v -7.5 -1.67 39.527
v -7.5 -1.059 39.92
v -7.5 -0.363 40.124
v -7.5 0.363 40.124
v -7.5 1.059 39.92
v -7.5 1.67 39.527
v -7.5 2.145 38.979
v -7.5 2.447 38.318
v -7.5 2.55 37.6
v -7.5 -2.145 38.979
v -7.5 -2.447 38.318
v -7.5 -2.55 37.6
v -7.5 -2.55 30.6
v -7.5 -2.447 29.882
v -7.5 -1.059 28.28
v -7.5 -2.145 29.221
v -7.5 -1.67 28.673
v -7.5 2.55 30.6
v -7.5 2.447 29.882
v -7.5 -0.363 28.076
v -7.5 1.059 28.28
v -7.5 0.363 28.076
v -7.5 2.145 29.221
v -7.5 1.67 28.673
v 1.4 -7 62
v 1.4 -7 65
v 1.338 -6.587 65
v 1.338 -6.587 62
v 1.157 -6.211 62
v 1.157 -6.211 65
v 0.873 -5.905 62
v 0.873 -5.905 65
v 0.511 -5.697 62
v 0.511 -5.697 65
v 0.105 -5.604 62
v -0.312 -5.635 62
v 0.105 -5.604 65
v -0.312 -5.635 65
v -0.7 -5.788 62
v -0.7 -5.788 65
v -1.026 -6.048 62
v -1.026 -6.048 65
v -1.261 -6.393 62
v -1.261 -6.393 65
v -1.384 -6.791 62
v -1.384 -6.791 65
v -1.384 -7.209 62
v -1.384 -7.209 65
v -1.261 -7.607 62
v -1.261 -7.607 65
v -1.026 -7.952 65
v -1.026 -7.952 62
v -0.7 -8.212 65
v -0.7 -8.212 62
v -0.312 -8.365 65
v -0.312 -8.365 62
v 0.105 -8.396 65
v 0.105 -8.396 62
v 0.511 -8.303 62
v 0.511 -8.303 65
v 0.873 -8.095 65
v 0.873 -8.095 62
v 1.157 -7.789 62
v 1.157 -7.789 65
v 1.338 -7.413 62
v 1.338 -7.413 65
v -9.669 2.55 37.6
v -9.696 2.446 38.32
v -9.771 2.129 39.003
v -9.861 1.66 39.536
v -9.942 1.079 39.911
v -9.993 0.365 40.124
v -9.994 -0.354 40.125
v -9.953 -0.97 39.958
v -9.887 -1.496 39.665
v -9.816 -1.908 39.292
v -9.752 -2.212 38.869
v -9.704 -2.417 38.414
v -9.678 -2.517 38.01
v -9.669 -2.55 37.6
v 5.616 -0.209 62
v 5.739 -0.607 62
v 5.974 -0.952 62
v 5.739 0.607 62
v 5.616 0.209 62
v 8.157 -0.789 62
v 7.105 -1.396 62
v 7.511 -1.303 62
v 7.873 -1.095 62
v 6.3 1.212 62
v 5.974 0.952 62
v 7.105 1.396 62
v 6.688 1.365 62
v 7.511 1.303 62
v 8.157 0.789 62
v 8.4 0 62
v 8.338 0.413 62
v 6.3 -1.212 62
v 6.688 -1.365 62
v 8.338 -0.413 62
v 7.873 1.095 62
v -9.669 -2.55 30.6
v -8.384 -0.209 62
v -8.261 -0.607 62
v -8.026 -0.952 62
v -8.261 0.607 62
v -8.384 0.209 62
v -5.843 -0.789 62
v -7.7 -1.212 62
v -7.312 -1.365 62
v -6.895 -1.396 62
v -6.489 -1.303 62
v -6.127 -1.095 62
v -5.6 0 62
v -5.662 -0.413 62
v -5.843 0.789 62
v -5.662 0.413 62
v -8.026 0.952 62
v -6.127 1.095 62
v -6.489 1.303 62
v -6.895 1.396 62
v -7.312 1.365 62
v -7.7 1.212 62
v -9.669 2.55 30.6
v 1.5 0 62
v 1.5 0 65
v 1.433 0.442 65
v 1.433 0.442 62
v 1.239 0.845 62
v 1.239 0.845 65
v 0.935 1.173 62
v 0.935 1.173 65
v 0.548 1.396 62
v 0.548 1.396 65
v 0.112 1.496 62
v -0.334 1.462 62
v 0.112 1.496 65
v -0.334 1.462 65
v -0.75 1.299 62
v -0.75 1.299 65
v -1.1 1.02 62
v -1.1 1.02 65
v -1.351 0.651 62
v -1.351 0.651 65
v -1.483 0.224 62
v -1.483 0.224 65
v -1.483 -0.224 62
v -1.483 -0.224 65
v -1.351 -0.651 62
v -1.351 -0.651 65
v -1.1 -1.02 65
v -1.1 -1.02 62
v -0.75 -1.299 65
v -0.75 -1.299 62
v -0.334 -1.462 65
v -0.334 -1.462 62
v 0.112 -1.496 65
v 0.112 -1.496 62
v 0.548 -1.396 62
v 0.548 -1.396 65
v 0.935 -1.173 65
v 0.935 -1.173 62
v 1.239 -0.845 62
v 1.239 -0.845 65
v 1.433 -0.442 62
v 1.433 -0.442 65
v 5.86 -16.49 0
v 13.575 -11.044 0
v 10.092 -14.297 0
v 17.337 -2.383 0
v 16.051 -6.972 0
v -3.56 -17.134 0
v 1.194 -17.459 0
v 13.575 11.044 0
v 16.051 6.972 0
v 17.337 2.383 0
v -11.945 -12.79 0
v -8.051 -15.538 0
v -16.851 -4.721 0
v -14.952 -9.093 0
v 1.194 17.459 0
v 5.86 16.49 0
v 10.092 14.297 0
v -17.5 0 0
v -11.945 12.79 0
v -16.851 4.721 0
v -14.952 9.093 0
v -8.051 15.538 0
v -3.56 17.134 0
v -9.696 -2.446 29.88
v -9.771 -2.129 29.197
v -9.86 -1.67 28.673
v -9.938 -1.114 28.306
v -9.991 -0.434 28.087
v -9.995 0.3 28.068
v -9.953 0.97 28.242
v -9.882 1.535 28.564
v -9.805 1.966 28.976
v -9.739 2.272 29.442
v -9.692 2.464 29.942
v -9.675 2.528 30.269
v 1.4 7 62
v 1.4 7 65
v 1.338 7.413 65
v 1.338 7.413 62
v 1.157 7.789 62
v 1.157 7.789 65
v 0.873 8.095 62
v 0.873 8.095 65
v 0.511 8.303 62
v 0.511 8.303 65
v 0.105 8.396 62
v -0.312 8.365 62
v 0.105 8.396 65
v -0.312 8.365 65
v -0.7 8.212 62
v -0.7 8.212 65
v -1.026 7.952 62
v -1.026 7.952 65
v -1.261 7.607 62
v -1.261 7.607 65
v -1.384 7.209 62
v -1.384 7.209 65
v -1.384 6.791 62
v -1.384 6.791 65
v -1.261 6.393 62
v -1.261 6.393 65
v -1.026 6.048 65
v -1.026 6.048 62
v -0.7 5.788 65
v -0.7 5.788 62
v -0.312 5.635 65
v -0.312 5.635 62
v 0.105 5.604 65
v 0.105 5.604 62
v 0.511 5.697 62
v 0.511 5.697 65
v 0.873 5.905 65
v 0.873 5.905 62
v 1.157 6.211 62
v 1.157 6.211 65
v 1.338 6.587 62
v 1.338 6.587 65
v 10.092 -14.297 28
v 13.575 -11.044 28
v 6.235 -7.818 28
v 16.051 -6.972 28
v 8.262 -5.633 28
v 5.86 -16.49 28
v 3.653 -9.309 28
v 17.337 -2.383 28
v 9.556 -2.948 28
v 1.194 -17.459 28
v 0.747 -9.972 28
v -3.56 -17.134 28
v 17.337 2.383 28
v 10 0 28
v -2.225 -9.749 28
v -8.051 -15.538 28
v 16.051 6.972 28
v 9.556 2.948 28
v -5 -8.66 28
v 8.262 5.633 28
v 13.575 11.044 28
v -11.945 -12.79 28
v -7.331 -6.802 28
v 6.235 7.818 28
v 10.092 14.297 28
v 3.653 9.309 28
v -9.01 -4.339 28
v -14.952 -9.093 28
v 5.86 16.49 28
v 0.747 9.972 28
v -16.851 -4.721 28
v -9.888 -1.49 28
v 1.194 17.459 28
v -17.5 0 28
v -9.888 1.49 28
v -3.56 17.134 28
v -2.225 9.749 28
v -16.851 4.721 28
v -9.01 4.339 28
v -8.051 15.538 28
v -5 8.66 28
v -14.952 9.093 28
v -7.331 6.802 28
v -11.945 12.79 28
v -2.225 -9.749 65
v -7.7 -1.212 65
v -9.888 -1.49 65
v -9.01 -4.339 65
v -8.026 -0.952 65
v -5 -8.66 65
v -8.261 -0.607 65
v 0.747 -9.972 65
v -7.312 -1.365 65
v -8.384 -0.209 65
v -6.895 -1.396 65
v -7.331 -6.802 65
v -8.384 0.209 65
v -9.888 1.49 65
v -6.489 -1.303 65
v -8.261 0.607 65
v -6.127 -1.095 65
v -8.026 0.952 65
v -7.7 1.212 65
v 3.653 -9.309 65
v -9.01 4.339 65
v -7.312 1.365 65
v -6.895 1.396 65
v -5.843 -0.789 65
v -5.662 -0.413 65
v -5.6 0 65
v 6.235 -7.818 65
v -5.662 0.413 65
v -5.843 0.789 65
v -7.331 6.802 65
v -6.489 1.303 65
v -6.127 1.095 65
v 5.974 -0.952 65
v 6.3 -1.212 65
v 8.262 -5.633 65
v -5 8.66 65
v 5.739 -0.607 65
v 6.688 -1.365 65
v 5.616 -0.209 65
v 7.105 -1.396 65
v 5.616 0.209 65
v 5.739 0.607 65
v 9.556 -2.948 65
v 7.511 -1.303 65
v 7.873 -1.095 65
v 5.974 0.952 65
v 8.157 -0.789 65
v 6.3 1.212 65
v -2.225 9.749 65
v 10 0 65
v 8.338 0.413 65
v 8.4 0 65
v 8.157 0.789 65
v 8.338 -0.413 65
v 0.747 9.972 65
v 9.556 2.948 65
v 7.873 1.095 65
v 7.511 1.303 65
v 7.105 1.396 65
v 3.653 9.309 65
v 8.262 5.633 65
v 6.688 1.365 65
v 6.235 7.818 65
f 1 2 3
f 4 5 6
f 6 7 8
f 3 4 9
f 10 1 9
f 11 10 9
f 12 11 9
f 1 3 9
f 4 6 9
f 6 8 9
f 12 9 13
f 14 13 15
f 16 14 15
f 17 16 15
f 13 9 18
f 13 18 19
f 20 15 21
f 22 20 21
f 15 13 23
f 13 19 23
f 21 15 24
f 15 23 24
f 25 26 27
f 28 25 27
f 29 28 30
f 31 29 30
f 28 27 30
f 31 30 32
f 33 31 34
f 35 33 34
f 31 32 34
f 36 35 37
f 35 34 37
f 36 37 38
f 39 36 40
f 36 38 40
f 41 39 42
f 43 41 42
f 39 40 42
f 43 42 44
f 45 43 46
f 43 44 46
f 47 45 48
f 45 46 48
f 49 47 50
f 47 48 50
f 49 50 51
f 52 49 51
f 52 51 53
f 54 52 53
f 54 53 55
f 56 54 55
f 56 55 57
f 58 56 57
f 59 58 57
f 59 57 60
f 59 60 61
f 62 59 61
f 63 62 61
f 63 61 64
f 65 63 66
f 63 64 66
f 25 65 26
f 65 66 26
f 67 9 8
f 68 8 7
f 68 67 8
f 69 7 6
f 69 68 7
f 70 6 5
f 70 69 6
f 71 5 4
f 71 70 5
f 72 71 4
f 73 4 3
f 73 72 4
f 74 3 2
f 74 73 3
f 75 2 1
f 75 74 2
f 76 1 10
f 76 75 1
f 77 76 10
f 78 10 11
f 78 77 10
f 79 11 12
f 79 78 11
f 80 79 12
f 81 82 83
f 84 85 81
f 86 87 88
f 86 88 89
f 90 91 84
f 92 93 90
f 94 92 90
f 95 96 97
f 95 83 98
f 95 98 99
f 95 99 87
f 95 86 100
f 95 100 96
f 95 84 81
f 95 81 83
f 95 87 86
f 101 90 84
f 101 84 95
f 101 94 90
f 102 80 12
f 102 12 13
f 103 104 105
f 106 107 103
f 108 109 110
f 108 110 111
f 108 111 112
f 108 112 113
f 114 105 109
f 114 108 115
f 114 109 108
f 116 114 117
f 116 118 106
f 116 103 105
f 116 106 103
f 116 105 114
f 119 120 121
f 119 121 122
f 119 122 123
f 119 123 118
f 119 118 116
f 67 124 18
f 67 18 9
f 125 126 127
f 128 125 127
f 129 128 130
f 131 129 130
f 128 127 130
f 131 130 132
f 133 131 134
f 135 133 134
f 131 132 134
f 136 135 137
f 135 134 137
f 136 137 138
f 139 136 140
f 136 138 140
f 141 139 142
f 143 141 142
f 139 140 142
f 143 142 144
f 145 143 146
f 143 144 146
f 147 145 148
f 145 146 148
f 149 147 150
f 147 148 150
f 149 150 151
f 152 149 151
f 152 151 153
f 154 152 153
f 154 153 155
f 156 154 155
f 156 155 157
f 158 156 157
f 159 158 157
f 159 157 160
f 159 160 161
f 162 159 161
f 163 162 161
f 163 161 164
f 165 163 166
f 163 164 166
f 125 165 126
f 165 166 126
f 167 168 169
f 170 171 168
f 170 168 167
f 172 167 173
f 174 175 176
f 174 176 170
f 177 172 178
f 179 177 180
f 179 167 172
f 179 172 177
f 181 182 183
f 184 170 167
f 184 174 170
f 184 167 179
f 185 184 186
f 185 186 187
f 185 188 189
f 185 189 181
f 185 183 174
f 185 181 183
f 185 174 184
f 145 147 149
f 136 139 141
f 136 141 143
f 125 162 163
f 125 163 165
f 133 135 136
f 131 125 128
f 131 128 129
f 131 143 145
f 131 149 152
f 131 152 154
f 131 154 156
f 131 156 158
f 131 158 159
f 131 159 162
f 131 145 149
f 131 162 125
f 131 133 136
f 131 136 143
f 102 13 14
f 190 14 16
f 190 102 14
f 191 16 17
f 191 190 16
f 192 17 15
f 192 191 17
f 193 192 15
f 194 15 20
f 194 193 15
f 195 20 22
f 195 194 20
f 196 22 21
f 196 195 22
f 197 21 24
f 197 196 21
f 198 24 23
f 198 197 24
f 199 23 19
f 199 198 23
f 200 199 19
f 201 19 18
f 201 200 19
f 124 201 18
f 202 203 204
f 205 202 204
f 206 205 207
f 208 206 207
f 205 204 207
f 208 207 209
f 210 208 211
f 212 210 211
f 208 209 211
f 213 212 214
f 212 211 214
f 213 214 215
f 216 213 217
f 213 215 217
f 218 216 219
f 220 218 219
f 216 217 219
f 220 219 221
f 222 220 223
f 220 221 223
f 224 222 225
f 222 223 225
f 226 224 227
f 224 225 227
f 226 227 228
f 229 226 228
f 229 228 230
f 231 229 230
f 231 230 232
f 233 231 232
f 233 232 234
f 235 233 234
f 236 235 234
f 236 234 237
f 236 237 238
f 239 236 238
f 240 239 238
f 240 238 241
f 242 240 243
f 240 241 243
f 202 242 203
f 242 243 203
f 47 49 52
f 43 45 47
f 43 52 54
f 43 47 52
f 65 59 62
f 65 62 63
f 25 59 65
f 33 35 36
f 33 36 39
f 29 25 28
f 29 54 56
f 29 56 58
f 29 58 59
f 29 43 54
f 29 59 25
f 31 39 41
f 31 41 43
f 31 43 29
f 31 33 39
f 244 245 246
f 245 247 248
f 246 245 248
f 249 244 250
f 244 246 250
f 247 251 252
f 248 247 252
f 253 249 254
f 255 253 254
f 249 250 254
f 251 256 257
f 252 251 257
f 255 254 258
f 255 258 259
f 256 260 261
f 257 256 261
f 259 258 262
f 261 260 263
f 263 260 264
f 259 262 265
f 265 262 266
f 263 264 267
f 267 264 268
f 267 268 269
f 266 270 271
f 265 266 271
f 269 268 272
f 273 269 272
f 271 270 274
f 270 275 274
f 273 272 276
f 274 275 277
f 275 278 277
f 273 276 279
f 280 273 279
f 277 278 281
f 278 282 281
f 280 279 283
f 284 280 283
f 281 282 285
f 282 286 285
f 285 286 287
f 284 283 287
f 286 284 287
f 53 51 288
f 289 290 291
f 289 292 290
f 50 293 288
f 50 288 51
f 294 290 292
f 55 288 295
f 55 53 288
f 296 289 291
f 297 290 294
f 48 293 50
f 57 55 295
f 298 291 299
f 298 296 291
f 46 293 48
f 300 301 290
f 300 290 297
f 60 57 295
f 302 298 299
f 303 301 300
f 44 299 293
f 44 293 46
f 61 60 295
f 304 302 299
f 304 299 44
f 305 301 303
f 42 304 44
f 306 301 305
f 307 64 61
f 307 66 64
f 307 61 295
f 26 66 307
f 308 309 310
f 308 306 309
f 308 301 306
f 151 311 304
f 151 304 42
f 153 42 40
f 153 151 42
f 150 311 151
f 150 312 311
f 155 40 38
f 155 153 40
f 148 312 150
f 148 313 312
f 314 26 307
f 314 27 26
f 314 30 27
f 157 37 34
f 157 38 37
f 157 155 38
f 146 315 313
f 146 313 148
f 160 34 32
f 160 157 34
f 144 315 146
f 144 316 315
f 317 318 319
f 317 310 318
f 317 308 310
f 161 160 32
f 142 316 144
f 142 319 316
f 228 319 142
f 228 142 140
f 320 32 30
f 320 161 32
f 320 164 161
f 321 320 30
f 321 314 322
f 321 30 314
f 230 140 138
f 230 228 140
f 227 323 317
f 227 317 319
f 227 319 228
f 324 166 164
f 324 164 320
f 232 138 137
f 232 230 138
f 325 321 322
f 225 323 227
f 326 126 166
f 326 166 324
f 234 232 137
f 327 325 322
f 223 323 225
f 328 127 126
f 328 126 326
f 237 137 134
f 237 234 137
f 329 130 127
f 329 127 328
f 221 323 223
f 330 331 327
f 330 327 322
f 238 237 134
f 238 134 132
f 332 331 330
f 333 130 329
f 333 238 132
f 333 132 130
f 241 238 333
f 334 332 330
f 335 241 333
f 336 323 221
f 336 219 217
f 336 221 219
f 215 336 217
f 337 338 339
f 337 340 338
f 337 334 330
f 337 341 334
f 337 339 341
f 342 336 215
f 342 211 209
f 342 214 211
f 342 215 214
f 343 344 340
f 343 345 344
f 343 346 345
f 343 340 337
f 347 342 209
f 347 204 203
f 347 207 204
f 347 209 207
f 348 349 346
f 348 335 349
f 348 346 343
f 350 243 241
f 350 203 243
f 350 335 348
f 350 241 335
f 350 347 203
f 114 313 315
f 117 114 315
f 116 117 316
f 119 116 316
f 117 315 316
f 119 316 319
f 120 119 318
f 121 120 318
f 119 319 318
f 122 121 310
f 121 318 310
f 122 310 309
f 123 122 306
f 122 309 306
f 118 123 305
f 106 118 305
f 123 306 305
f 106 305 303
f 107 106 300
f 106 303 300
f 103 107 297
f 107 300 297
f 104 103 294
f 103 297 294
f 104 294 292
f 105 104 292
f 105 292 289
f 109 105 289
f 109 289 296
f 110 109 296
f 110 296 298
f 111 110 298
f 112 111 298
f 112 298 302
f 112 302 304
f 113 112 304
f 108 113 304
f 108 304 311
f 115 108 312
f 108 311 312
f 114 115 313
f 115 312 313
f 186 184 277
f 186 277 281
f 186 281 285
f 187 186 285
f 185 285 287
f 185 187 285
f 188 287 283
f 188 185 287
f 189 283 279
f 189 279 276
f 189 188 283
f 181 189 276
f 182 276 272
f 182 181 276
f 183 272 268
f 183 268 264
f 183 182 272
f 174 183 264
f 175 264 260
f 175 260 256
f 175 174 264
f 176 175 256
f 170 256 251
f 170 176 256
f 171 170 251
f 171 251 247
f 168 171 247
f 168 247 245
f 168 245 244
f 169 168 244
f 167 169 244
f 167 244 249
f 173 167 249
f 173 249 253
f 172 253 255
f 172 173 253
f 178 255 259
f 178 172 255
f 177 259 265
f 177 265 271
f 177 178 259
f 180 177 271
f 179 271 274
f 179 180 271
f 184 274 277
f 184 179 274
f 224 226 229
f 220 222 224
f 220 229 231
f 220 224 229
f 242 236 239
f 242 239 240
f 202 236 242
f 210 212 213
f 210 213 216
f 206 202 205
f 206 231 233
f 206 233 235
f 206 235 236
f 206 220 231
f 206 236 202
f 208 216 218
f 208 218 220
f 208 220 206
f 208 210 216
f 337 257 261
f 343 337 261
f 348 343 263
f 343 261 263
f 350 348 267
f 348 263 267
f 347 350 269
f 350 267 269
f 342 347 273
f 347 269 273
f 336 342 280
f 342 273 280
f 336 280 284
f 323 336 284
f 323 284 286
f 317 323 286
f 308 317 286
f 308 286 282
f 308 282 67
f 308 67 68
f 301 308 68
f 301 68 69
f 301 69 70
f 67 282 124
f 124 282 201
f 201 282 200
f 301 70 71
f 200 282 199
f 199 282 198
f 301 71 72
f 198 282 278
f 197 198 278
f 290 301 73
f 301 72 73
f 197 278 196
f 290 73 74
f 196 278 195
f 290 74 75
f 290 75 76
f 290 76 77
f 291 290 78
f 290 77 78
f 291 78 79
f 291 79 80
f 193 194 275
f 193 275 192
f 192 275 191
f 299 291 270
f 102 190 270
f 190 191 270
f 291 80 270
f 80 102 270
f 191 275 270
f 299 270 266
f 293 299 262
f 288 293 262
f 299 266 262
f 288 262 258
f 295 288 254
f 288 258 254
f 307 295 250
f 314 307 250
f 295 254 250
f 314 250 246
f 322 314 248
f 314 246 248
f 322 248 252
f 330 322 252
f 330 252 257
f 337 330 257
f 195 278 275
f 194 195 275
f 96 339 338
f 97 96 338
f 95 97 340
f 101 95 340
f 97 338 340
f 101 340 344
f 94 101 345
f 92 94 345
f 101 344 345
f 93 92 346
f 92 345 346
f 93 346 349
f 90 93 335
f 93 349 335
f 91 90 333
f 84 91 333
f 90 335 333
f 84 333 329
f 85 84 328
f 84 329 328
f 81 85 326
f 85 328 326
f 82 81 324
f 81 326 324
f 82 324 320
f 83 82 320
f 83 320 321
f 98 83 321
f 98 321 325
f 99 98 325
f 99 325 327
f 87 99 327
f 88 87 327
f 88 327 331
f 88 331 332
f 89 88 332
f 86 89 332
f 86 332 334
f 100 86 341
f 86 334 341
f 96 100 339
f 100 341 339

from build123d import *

# Parameters (mm, degrees)
SKETCH_1_R          = 10
EXTRUDE_1_DEPTH     = 65
CUT_EXTRUDE_1_DEPTH = 2.5
SKETCH_3_R          = 17.5
EXTRUDE_2_DEPTH     = 28
SKETCH_4_R          = 1.4
CUT_EXTRUDE_2_DEPTH = 3
SKETCH_5_R          = 1.5
CUT_EXTRUDE_3_DEPTH = 3


with BuildPart() as part:
    # 草图1 → 凸台-拉伸1 (new body)
    with BuildSketch(Plane.XY):
        Circle(SKETCH_1_R)
    extrude(amount=EXTRUDE_1_DEPTH)

    # 草图2 → 切除-拉伸1 (cut)
    with BuildSketch(Plane.ZY.offset(10)):
        with BuildLine():
            Line((30.6, 2.55), (37.6, 2.55))
            ThreePointArc((37.6, 2.55), (40.15, 0), (37.6, -2.55))
            Line((37.6, -2.55), (30.6, -2.55))
            ThreePointArc((30.6, -2.55), (28.05, 0), (30.6, 2.55))
        make_face()
    extrude(amount=-CUT_EXTRUDE_1_DEPTH, mode=Mode.SUBTRACT)

    # 草图3 → 凸台-拉伸2 (add)
    with BuildSketch(Plane(origin=(0, 0, 0), x_dir=(-1, 0, 0), z_dir=(0, 0, -1))):
        Circle(SKETCH_3_R)
    extrude(amount=-EXTRUDE_2_DEPTH)

    # 草图4 → 切除-拉伸2 (cut)
    with BuildSketch(Plane.XY.offset(65)):
        with Locations((0, 7)):
            Circle(SKETCH_4_R)
        with Locations((7, 0)):
            Circle(SKETCH_4_R)
        with Locations((0, -7)):
            Circle(SKETCH_4_R)
        with Locations((-7, 0)):
            Circle(SKETCH_4_R)
    extrude(amount=-CUT_EXTRUDE_2_DEPTH, mode=Mode.SUBTRACT)

    # 草图5 → 切除-拉伸3 (cut)
    with BuildSketch(Plane.XY.offset(65)):
        Circle(SKETCH_5_R)
    extrude(amount=-CUT_EXTRUDE_3_DEPTH, mode=Mode.SUBTRACT)


solid = part.part
